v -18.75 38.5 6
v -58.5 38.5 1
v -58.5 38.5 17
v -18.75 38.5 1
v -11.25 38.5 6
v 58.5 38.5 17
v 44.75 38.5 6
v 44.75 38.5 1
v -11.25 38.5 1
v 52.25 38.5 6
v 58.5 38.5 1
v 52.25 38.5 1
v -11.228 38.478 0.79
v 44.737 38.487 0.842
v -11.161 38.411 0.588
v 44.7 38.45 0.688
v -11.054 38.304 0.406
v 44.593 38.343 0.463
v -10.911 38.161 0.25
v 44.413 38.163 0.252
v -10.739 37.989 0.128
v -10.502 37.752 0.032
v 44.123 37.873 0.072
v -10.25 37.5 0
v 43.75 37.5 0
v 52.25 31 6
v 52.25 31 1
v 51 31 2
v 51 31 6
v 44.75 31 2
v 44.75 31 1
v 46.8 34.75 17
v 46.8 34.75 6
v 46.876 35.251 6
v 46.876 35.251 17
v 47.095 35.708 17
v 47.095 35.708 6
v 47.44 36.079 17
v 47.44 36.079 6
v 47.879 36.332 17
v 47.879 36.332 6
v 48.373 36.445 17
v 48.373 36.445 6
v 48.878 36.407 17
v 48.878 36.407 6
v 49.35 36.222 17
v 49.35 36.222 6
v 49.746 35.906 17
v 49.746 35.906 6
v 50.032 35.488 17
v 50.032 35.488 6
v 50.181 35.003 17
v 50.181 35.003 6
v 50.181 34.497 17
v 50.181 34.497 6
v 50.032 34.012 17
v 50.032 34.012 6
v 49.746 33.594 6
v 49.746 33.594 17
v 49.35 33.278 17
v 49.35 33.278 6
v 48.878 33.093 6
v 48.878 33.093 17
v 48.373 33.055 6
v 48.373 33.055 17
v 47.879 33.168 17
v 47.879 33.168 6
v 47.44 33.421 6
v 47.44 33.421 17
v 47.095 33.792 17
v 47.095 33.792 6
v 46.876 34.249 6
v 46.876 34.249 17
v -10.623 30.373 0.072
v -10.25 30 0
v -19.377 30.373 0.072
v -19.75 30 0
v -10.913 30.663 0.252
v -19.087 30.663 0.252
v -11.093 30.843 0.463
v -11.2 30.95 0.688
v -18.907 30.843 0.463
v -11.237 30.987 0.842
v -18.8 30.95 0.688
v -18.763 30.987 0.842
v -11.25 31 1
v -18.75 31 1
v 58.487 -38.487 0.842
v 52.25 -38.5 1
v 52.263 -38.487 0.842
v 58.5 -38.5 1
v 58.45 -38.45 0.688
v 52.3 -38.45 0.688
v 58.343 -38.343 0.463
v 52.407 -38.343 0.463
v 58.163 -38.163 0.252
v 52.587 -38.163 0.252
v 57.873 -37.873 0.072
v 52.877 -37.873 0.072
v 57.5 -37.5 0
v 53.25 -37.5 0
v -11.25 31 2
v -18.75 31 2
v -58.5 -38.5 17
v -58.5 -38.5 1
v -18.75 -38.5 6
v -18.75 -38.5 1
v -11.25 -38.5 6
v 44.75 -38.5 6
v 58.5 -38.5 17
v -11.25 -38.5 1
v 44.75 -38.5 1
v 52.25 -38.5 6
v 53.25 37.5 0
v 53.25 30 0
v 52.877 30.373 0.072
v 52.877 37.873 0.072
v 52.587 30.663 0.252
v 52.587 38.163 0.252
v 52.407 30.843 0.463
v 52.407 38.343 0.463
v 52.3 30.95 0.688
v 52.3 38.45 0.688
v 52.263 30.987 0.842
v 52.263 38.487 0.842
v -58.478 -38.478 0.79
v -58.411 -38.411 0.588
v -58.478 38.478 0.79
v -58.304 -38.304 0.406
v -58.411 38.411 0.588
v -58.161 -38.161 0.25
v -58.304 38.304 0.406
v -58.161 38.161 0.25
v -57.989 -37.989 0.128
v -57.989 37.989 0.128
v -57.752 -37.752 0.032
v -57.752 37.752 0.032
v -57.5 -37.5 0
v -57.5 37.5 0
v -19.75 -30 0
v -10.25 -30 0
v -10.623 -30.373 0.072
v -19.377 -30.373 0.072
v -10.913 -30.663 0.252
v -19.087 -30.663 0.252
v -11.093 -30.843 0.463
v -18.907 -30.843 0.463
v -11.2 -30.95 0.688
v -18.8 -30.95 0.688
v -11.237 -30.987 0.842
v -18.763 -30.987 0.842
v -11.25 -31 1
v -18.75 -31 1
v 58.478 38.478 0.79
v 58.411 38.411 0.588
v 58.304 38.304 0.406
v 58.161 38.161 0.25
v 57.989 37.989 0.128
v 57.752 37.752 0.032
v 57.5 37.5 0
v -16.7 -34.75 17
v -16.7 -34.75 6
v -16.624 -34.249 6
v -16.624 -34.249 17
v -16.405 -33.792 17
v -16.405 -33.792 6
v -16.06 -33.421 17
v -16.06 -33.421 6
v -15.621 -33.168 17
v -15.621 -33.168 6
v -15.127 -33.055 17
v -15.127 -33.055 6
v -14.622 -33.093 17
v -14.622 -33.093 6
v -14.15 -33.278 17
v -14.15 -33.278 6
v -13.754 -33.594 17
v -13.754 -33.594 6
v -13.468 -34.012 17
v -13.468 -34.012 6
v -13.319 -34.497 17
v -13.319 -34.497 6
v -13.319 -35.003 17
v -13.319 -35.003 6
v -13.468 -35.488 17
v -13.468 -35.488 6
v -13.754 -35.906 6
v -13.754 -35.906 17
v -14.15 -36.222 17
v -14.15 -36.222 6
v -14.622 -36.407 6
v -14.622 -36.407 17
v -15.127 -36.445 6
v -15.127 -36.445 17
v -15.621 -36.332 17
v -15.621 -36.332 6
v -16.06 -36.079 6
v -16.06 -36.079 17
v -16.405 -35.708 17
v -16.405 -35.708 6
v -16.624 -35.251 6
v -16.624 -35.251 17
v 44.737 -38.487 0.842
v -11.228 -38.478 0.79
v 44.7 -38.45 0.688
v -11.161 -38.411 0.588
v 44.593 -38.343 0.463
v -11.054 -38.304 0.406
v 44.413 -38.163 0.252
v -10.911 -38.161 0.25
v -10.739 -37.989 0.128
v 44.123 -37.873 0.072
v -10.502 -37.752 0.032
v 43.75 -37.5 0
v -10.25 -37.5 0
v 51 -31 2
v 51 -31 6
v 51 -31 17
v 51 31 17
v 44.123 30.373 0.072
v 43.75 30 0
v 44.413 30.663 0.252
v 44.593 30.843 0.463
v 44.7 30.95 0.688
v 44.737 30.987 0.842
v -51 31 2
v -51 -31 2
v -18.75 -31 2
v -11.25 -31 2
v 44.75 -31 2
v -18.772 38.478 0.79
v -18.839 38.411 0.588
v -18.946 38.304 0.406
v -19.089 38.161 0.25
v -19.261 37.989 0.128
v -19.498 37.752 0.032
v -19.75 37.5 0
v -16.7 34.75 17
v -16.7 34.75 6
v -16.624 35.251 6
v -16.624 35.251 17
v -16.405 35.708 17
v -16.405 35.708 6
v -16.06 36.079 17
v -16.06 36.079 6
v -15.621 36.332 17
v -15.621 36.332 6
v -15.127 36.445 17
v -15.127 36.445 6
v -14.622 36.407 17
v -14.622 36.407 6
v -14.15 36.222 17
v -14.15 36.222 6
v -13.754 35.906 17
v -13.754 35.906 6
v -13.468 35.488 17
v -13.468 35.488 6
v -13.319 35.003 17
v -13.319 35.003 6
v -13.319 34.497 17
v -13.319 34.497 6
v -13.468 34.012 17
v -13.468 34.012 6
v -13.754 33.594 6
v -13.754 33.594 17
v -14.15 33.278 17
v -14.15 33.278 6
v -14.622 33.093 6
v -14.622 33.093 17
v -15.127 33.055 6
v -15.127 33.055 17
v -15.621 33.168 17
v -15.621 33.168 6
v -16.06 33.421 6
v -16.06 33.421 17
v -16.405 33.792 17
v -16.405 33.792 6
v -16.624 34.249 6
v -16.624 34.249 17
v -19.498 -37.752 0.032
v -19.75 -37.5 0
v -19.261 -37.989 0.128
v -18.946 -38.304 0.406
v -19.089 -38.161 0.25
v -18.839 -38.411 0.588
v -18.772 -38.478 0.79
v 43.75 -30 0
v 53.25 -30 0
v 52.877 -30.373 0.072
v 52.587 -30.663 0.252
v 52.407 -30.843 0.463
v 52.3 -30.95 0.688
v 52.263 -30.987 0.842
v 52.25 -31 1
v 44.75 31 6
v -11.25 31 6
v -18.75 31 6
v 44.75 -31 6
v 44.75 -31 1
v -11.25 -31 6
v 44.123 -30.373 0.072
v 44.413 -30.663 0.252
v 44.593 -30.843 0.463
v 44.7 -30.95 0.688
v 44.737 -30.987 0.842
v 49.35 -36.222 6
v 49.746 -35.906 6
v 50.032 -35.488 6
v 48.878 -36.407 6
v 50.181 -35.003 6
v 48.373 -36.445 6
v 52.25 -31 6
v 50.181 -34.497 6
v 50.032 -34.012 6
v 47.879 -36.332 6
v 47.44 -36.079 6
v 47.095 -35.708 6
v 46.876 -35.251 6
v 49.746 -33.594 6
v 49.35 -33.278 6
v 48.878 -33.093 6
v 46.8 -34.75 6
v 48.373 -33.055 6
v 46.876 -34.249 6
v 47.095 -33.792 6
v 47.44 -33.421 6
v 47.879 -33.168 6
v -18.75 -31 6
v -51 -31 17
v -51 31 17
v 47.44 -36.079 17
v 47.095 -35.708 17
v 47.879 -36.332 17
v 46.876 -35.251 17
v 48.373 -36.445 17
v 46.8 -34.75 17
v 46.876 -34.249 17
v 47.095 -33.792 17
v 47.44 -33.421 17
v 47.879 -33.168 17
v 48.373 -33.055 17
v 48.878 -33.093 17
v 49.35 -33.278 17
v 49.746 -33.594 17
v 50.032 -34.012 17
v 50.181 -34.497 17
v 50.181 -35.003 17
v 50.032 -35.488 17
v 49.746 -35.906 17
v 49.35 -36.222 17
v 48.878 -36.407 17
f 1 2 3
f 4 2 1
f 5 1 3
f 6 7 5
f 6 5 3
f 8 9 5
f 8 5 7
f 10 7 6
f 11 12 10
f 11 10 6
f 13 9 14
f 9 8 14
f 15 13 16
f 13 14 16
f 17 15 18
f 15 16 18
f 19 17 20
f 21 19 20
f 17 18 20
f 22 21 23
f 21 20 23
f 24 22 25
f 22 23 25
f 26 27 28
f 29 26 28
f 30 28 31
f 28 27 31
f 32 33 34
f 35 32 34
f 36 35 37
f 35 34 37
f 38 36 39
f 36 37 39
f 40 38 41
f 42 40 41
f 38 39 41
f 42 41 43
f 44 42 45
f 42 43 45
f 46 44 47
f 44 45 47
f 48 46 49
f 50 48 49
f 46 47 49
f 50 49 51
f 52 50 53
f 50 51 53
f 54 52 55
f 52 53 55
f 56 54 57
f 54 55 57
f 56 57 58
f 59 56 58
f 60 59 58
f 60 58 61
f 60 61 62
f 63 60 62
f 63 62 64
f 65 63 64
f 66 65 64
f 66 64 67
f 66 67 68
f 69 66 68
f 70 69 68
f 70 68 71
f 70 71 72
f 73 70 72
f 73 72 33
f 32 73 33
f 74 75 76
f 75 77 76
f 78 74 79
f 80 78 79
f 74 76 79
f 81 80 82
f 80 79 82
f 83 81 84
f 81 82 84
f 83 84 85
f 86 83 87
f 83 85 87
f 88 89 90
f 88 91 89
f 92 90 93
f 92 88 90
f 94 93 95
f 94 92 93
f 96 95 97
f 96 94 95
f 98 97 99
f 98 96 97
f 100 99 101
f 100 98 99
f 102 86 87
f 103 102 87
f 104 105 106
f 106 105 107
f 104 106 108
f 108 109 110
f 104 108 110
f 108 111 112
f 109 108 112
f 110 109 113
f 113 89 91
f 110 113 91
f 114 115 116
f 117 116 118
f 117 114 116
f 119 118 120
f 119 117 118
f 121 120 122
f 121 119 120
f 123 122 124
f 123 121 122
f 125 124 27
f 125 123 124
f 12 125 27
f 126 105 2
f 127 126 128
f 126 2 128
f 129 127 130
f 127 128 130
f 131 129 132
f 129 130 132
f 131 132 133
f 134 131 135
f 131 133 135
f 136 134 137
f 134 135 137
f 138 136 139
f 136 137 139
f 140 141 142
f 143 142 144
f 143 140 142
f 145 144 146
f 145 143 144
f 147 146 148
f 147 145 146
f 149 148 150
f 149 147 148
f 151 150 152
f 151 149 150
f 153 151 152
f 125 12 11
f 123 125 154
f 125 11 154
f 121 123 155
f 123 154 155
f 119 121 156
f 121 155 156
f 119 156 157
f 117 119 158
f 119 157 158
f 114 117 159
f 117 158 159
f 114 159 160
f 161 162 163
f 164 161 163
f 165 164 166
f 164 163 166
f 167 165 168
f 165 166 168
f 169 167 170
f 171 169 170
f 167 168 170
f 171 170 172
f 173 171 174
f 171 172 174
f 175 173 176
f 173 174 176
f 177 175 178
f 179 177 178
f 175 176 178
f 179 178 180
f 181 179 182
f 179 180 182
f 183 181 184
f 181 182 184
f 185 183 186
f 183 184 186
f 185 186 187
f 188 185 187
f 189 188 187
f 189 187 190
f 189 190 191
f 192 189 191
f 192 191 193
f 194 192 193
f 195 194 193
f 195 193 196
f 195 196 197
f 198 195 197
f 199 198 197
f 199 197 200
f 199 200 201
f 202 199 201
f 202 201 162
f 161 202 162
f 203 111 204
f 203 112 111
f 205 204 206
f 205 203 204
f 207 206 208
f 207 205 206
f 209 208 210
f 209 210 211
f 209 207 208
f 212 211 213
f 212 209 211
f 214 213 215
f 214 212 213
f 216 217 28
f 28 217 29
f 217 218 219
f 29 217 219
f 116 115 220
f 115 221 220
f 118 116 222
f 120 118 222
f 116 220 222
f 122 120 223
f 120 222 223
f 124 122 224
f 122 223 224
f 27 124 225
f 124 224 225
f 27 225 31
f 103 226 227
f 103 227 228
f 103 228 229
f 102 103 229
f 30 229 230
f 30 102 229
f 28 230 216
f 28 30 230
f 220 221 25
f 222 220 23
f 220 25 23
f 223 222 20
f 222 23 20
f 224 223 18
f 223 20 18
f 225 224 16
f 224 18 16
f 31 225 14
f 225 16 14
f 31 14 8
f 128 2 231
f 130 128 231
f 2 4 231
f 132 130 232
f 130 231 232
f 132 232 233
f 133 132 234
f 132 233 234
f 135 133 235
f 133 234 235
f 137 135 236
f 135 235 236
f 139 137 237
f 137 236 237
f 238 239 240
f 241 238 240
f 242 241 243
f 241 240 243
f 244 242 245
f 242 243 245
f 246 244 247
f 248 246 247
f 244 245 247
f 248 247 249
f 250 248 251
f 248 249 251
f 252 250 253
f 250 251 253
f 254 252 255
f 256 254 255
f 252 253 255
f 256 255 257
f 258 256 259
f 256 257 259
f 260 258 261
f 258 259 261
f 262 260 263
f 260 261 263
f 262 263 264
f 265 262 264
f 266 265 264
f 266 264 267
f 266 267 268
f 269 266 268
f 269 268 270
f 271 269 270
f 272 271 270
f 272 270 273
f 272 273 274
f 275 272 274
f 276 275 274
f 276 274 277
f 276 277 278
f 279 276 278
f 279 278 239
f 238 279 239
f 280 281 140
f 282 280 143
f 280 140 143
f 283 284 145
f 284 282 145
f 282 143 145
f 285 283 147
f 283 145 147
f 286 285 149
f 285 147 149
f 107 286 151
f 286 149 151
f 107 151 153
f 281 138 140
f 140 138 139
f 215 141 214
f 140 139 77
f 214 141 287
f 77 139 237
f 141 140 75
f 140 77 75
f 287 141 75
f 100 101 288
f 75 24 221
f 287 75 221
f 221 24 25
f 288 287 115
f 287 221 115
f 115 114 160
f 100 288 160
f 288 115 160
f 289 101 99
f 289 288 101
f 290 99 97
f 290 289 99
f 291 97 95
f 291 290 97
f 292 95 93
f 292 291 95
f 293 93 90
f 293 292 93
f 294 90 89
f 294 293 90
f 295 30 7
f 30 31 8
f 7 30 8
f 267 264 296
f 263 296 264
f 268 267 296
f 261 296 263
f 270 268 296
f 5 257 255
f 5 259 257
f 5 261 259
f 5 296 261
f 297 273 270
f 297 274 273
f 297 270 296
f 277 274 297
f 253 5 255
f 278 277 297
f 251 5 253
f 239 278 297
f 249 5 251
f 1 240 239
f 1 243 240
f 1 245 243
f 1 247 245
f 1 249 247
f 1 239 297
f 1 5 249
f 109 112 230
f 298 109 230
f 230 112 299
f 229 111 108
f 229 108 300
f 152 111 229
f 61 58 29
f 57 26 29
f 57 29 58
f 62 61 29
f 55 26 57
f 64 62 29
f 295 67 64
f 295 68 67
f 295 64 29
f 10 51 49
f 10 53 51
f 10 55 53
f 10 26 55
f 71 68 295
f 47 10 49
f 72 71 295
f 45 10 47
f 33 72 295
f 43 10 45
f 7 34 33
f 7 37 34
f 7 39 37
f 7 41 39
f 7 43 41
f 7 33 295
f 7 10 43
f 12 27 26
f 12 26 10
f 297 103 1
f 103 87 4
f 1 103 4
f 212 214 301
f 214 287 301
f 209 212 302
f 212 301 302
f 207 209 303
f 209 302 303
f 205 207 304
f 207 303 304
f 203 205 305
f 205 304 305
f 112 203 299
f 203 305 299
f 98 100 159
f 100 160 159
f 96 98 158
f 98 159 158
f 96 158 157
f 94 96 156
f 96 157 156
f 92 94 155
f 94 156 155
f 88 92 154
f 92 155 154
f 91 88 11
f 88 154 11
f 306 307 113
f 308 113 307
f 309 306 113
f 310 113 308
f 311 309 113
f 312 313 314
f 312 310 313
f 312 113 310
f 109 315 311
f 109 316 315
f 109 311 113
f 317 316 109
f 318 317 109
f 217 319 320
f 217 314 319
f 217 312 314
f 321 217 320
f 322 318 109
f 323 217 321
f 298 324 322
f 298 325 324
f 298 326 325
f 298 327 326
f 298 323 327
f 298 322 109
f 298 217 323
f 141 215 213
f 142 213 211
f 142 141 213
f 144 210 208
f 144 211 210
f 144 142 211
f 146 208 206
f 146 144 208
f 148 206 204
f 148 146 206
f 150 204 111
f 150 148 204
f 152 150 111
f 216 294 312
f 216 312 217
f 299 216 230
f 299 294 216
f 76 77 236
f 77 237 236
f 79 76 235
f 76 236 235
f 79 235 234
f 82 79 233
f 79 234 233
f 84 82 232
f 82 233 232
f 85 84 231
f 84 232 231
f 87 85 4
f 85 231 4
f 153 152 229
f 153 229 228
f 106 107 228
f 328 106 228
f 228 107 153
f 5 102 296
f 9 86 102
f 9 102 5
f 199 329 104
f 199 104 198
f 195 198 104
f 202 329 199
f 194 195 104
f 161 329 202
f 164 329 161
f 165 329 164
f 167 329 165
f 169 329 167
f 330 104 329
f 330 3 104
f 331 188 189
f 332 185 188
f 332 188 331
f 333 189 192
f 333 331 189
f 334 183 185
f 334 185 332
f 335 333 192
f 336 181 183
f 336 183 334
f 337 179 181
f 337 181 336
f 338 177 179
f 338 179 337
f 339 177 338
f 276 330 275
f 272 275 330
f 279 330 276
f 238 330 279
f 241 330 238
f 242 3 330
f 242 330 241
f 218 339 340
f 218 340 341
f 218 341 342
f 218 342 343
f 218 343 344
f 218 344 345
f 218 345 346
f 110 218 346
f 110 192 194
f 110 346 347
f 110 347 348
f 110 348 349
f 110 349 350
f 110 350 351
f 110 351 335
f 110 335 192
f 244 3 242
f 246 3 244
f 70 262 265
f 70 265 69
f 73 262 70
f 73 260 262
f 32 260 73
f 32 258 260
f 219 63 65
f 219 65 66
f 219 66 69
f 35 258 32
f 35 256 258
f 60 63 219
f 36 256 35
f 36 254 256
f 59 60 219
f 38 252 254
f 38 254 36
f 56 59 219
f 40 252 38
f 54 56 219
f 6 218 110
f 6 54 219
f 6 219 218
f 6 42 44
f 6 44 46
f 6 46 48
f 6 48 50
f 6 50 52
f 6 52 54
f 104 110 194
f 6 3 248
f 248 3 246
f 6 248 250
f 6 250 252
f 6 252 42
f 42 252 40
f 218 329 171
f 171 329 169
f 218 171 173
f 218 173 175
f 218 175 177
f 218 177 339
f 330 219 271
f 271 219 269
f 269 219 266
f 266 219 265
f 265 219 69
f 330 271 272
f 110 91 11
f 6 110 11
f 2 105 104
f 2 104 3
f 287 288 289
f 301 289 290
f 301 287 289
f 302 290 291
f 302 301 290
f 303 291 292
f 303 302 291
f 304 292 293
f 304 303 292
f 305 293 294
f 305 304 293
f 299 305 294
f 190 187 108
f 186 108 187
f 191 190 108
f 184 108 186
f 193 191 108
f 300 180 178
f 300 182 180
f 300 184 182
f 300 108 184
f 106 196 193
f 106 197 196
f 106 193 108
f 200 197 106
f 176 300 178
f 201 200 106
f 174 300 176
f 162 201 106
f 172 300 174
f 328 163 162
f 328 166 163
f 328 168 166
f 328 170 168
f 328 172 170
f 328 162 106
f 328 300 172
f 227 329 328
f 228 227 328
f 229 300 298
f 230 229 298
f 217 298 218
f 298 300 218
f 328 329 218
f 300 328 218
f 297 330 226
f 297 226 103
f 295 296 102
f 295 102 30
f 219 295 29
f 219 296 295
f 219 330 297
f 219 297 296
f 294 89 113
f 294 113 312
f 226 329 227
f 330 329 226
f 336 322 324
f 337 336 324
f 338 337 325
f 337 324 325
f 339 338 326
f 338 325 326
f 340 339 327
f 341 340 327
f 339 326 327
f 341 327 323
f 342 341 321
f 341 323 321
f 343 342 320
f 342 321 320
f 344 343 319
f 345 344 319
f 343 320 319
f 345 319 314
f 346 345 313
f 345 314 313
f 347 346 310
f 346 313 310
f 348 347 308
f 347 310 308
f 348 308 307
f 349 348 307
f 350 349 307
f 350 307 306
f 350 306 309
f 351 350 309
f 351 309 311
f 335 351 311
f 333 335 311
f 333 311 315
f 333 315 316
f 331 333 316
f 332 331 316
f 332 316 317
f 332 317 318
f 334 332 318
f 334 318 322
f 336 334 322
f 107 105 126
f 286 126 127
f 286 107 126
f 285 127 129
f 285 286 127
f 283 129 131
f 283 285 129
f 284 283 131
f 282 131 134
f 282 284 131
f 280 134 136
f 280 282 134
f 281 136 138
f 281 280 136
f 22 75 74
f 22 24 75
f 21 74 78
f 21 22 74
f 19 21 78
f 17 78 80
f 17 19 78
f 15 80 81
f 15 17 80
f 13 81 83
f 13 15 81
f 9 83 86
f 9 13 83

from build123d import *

# Parameters (mm, degrees)
SKETCH_1_W          = 117
SKETCH_1_H          = 77
EXTRUDE_1_DEPTH     = 17
SKETCH_2_W          = 102
SKETCH_2_H          = 62
CUT_EXTRUDE_1_DEPTH = 15
SKETCH_4_R          = 1.7
CUT_EXTRUDE_2_DEPTH = 73.065942025
SKETCH_5_W          = 7.5
SKETCH_5_H          = 7.5
CUT_EXTRUDE_3_DEPTH = 6
FILLET_2_R          = 1


with BuildPart() as part:
    # ｽｹｯﾁ1 → ﾎﾞｽ - 押し出し1 (new body)
    with BuildSketch(Plane.XY):
        Rectangle(SKETCH_1_W, SKETCH_1_H)
    extrude(amount=EXTRUDE_1_DEPTH)

    # ｽｹｯﾁ2 → ｶｯﾄ - 押し出し1 (cut)
    with BuildSketch(Plane.XY.offset(17)):
        Rectangle(SKETCH_2_W, SKETCH_2_H)
    extrude(amount=-CUT_EXTRUDE_1_DEPTH, mode=Mode.SUBTRACT)

    # ｽｹｯﾁ4 → ｶｯﾄ - 押し出し2 (cut, through all)
    with BuildSketch(Plane(origin=(0, 0, 0), x_dir=(-1, 0, 0), z_dir=(0, 0, -1))):
        with Locations((15, 34.75)):
            Circle(SKETCH_4_R)
        with Locations((15, -34.75)):
            Circle(SKETCH_4_R)
        with Locations((-48.5, -34.75)):
            Circle(SKETCH_4_R)
        with Locations((-48.5, 34.75)):
            Circle(SKETCH_4_R)
    extrude(amount=-CUT_EXTRUDE_2_DEPTH, mode=Mode.SUBTRACT)

    # ｽｹｯﾁ5 → ｶｯﾄ - 押し出し3 (cut)
    with BuildSketch(Plane(origin=(0, 0, 0), x_dir=(-1, 0, 0), z_dir=(0, 0, -1))):
        with Locations((-48.5, -34.75)):
            Rectangle(SKETCH_5_W, SKETCH_5_H)
        with Locations((-48.5, 34.75)):
            Rectangle(SKETCH_5_W, SKETCH_5_H)
        with Locations((15, 34.75)):
            Rectangle(SKETCH_5_W, SKETCH_5_H)
        with Locations((15, -34.75)):
            Rectangle(SKETCH_5_W, SKETCH_5_H)
    extrude(amount=-CUT_EXTRUDE_3_DEPTH, mode=Mode.SUBTRACT)

    # ﾌｨﾚｯﾄ2
    fillet_2_edges = [part.edges().sort_by_distance(p)[0] for p in [
        (44.75, 34.75, 0),
        (52.25, 34.75, 0),
        (48.5, 31, 0),
        (44.75, -34.75, 0),
        (48.5, -31, 0),
        (52.25, -34.75, 0),
        (55.375, 38.5, 0),
        (58.5, 0, 0),
        (-38.625, -38.5, 0),
        (-58.5, 0, 0),
        (16.75, 38.5, 0),
        (-38.625, 38.5, 0),
        (16.75, -38.5, 0),
        (55.375, -38.5, 0),
        (-18.75, -34.75, 0),
        (-15, -31, 0),
        (-11.25, -34.75, 0),
        (-18.75, 34.75, 0),
        (-11.25, 34.75, 0),
        (-15, 31, 0),
    ]]
    fillet(fillet_2_edges, radius=FILLET_2_R)


solid = part.part
